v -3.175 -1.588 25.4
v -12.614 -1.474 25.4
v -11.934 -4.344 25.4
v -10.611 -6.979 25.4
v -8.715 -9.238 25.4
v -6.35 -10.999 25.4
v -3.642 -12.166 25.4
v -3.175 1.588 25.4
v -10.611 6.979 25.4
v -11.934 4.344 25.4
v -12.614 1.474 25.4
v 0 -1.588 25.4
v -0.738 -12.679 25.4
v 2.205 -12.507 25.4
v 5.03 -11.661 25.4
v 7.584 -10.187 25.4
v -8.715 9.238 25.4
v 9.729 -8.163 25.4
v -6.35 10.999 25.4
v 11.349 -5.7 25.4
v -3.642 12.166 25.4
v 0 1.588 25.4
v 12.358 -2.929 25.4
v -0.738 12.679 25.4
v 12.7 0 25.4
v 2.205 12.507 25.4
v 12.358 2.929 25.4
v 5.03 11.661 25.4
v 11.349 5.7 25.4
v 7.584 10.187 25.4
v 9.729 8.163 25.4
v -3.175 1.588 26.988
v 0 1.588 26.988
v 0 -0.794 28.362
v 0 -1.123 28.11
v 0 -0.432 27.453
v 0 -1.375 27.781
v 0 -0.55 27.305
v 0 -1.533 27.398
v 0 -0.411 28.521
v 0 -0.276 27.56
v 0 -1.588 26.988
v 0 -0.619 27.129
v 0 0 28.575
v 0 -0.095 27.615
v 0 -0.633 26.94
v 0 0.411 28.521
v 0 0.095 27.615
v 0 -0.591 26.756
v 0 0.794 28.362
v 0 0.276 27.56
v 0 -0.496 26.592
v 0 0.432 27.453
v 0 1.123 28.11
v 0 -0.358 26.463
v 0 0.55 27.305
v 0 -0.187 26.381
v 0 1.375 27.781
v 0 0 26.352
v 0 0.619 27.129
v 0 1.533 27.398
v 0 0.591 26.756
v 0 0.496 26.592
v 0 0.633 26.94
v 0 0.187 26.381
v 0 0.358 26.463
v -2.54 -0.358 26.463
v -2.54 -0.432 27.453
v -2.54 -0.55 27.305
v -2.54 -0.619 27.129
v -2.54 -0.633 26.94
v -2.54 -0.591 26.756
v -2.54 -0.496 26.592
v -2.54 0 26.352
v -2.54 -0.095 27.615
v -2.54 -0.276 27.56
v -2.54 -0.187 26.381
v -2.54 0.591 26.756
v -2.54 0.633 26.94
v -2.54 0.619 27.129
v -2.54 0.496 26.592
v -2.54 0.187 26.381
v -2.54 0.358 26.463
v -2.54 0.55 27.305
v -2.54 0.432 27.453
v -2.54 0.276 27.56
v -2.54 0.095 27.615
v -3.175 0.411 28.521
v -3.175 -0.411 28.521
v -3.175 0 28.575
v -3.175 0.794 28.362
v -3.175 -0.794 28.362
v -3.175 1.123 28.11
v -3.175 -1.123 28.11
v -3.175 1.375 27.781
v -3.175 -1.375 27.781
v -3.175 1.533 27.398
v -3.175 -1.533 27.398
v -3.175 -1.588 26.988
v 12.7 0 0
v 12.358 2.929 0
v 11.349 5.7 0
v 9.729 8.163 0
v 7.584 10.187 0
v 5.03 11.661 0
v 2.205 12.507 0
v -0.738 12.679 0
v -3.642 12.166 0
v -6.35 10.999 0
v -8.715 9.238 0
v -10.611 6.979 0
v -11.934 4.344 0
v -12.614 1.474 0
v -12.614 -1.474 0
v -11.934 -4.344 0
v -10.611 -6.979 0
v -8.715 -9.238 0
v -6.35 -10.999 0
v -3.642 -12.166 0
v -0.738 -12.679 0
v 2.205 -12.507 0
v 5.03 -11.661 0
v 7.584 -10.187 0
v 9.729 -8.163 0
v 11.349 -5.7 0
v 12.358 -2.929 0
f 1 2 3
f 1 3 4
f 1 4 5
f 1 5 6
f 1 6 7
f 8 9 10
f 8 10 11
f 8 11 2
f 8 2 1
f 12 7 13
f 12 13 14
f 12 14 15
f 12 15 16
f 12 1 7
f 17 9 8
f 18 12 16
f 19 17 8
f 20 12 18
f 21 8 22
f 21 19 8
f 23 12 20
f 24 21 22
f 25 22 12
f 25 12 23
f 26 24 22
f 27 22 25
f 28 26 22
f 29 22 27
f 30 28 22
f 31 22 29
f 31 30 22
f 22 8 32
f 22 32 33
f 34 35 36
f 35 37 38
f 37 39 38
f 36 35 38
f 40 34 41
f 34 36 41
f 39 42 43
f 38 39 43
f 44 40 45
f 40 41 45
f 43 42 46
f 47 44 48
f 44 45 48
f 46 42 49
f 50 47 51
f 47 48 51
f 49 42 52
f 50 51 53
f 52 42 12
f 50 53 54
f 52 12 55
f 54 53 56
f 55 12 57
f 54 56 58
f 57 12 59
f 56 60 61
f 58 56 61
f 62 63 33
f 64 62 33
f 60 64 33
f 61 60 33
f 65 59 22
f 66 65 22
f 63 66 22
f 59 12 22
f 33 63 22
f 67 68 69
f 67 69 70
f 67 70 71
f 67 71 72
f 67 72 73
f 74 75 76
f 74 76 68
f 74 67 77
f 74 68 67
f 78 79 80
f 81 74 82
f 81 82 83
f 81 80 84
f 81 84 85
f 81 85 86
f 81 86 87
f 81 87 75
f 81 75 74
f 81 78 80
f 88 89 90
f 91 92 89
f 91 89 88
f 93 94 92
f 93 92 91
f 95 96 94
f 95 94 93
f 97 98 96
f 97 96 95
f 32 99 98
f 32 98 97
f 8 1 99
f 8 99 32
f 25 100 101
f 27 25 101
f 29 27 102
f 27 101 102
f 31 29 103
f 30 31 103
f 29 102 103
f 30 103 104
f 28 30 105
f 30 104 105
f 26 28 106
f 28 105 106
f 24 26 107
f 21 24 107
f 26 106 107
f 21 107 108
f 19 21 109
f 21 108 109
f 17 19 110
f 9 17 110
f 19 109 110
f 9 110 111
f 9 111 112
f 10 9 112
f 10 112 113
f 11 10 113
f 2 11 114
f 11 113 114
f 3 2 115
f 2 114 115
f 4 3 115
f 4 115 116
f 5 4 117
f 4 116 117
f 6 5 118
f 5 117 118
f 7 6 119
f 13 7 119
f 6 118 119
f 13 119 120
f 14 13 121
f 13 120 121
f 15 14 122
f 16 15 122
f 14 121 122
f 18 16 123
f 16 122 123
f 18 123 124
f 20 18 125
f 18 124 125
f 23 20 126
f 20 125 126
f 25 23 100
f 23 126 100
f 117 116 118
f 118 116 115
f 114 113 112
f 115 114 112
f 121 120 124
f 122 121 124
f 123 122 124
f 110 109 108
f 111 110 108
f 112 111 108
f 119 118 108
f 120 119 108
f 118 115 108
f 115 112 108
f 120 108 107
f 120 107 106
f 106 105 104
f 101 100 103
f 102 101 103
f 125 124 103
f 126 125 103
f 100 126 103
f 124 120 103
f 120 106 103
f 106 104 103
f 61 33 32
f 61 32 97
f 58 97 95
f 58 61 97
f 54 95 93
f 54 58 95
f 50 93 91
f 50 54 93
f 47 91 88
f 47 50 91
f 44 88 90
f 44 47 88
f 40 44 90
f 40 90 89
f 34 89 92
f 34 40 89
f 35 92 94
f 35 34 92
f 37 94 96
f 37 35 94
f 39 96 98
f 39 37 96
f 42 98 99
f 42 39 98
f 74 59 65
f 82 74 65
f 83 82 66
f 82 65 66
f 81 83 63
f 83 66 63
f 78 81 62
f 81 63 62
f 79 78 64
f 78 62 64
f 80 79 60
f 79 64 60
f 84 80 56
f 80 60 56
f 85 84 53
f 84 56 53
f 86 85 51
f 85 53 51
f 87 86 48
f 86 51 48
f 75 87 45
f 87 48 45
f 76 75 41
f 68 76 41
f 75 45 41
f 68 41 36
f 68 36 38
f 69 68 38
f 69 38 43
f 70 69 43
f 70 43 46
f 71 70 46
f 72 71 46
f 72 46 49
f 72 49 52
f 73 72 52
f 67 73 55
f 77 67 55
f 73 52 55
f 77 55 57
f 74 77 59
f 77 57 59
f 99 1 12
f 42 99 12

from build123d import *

# Parameters (mm, degrees)
SKETCH2_R           = 12.7
BOSS_EXTRUDE1_DEPTH = 25.4
SKETCH3_W           = 3.175
SKETCH3_H           = 3.175
BOSS_EXTRUDE2_DEPTH = 3.175
CUT_EXTRUDE1_START  = -3.175
CUT_EXTRUDE1_DEPTH  = 3.175
SKETCH6_R           = 0.635
CUT_EXTRUDE2_DEPTH  = 2.54


# Read off the part's stored shape, not the designer's step: Cut-Extrude1
with BuildPart() as part:
    # Sketch2 → Boss-Extrude1 (new body)
    with BuildSketch(Plane.XY):
        Circle(SKETCH2_R)
    extrude(amount=BOSS_EXTRUDE1_DEPTH)

    # Sketch3 → Boss-Extrude2 (add)
    with BuildSketch(Plane.XY.offset(25.4)):
        with Locations((-1.5875, 0)):
            Rectangle(SKETCH3_W, SKETCH3_H)
    extrude(amount=BOSS_EXTRUDE2_DEPTH)

    # Cut-Extrude1 outline → Cut-Extrude1 (cut)
    with BuildSketch(Plane.ZY.offset(3.175).offset(CUT_EXTRUDE1_START)):
        with BuildLine():
            Line((28.575, 1.5875), (26.9875, 1.5875))
            ThreePointArc((26.9875, 1.5875), (28.110032015, 1.122532015), (28.575, 0))
            Line((28.575, 0), (28.575, 1.5875))
        make_face()
        with BuildLine():
            Line((28.575, -1.5875), (28.575, 0))
            ThreePointArc((28.575, 0), (28.110032015, -1.122532015), (26.9875, -1.5875))
            Line((26.9875, -1.5875), (28.575, -1.5875))
        make_face()
    extrude(amount=CUT_EXTRUDE1_DEPTH, mode=Mode.SUBTRACT)

    # Sketch6 → Cut-Extrude2 (cut)
    with BuildSketch(Plane(origin=(0, 0, 0), x_dir=(0, 0, -1), z_dir=(1, 0, 0))):
        with Locations((-26.9875, 0)):
            Circle(SKETCH6_R)
    extrude(amount=-CUT_EXTRUDE2_DEPTH, mode=Mode.SUBTRACT)


solid = part.part
